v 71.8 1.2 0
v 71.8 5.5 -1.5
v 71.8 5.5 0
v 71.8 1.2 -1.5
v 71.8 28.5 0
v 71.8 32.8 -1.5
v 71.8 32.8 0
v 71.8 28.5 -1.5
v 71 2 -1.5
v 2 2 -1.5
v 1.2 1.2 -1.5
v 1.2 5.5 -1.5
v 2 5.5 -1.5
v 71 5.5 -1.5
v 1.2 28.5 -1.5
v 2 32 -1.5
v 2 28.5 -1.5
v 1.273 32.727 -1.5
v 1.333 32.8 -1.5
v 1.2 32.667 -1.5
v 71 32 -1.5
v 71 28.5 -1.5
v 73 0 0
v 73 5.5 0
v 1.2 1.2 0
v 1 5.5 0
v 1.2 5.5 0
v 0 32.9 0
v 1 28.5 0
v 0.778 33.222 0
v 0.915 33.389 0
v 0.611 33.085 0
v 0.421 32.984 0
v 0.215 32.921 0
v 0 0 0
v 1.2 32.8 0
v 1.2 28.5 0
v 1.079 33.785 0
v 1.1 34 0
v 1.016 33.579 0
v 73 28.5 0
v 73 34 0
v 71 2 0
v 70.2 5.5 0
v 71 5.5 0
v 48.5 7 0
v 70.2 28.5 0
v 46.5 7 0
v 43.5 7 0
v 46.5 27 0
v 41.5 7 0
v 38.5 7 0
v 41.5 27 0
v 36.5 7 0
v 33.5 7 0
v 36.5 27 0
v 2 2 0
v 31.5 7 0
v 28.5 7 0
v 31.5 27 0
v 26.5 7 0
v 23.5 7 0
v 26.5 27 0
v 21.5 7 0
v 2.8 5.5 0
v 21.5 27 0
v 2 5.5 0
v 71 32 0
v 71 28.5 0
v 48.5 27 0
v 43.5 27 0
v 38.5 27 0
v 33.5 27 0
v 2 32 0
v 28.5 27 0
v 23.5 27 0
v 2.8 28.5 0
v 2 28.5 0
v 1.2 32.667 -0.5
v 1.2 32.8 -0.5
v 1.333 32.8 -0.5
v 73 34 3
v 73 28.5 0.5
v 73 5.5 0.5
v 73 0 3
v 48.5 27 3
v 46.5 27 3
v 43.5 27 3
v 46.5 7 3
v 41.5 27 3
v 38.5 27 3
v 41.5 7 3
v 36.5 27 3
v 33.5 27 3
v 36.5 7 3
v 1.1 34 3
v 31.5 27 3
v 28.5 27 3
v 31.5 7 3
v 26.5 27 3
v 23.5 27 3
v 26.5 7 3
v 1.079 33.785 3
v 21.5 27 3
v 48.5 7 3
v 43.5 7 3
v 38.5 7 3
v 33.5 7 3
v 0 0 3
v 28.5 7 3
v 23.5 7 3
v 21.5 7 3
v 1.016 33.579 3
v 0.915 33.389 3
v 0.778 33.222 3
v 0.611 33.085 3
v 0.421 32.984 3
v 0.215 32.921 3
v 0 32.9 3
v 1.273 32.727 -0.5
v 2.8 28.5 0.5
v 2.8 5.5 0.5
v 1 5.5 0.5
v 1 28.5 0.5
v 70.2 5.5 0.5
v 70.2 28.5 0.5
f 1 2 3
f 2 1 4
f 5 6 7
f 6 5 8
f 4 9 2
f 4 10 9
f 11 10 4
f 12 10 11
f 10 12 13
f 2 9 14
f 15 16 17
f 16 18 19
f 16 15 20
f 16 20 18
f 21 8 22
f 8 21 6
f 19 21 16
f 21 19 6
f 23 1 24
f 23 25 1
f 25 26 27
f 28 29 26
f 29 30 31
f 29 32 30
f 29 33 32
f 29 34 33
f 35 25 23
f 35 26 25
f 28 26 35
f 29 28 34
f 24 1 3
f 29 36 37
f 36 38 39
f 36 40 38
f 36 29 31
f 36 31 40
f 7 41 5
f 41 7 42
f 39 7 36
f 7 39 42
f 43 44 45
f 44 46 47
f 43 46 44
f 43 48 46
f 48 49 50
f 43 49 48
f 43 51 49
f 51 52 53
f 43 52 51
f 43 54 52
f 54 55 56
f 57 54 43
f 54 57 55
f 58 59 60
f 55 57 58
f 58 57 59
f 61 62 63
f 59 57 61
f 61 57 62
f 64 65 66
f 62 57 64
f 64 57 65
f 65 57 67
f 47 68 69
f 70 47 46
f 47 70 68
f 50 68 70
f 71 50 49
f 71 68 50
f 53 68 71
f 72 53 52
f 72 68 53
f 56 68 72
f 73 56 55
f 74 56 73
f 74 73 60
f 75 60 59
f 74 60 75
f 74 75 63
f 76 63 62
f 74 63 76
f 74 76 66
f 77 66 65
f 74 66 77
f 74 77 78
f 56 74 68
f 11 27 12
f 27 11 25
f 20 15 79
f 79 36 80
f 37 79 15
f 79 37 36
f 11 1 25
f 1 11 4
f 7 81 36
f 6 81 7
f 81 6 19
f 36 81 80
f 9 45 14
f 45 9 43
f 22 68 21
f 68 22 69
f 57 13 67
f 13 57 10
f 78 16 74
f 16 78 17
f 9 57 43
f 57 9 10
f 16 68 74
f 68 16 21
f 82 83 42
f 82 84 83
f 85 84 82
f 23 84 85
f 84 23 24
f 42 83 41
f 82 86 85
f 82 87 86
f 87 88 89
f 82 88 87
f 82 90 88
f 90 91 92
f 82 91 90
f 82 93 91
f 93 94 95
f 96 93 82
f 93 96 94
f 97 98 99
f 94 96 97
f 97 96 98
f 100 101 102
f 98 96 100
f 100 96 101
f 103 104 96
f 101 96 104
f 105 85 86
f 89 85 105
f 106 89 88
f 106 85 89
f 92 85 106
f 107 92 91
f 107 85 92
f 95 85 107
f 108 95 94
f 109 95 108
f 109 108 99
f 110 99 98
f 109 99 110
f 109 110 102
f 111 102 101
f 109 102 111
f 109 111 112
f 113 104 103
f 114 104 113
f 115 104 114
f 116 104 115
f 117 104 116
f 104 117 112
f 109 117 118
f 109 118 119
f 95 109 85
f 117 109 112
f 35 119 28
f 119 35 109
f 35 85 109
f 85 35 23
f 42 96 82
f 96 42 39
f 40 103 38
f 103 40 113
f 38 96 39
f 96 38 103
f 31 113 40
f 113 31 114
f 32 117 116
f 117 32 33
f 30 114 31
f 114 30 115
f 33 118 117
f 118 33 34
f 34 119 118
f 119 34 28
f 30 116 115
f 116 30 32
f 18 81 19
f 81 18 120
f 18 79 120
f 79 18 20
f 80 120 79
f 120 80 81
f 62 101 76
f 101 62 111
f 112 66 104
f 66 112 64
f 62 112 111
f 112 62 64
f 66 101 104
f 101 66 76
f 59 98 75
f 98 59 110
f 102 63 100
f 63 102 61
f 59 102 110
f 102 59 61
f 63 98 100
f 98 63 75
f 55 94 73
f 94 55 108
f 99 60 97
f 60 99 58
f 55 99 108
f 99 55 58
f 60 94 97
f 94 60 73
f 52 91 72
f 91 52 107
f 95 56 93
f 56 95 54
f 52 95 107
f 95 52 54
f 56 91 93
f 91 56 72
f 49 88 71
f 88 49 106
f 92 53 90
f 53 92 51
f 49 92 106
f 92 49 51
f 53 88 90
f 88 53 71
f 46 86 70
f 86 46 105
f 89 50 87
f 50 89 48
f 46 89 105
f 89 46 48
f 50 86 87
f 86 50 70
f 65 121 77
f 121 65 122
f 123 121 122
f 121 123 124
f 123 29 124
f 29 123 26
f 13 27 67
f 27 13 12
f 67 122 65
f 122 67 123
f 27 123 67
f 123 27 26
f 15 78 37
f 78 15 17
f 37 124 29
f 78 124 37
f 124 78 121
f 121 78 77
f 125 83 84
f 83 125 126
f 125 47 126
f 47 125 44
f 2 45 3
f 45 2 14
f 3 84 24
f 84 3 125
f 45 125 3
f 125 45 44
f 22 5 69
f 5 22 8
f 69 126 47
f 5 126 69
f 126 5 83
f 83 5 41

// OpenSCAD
// ==========================================
// Raspberry Pi Zero 2 W - Bento Box (Top Cover) - 3.0mm Cover Thickness
// ==========================================

// --- Raspberry Pi Zero 2 W 基本サイズ ---
pi_w = 69.0; // SDカードの2mmはみ出しを含めた調整値
pi_d = 30.0; 

// --- ケースの基本設定 ---
thickness       = 1.0;    // 周囲の壁の厚み (1.0mm)
clearance       = 1.0;    // 基板とケース内壁の隙間
cover_thickness = 3.0;    // 🛠️【新機能】蓋の天面プレート自体の厚みを3.0mmに強化
cover_h         = 1.5;    // 内部部品と干渉しないようインロー高さを1.5mmに最適化

// 内寸と外寸の計算
inner_w = pi_w + (clearance * 2);
inner_d = pi_d + (clearance * 2);
outer_w = inner_w + (thickness * 2);
outer_d = inner_d + (thickness * 2); // 🛠️【修正】thickness=1.0により、正確に 34.0mm に固定されます

// 🔩 反対側（奥側）のフチから手前に向かって「9.0mm」離した位置（Y=25.0）に固定
bracket_y = 25.0; 

bracket_screw_pass_r = 1.1; // M2ネジがスムーズに通る直径2.2mmの穴

$fn = 32;

// --- メインレンダリング ---
// 3Dプリンターベッドの上に正しく接地するように座標修正
translate([0, outer_d, cover_thickness])
    rotate([180, 0, 0])
        top_cover();

// --- モジュール定義 ---
module top_cover() {
    fit_gap       = 0.2; // 嵌め合い部（インロー）のクリアランス
    lip_thickness = 0.8; // インローの突起自体の肉厚
    
    difference() {
        union() {
            // 🛠️ 蓋の天面プレート（厚みを3.0mmに強化）
            cube([outer_w, outer_d, cover_thickness]);
            
            // 凹凸の噛み合わせ（インロー固定部）
            translate([thickness + fit_gap, thickness + fit_gap, cover_thickness])
                difference() {
                    cube([inner_w - (fit_gap * 2), inner_d - (fit_gap * 2), cover_h]);
                    
                    // 内側をくり抜いて突起（リップ）を形成
                    translate([lip_thickness, lip_thickness, -0.5])
                        cube([
                            inner_w - (fit_gap * 2) - (lip_thickness * 2), 
                            inner_d - (fit_gap * 2) - (lip_thickness * 2), 
                            cover_h + 1
                        ]);
                }
        }
        
        // ✂️ ボトム側の左右21mm窓と干渉するインローの壁をカットする処理
        translate([thickness, outer_d/2 - 11.5, cover_thickness - 0.5])
            cube([lip_thickness + 1, 23, cover_h + 1]);
            
        translate([outer_w - thickness - lip_thickness - 1, outer_d/2 - 11.5, cover_thickness - 0.5])
            cube([lip_thickness + 2, 23, cover_h + 1]);

        // 🔩 🛠️【修正】3.0mmの厚みを完全に撃ち抜くネジ穴（絶対零度から貫通させます）
        translate([0, 0, -0.5]) {
            bracket_mount_hole(7.0, bracket_y);
            bracket_mount_hole(16.0, bracket_y);
        }

        // 放熱用のスリット穴（3mm厚を確実に貫通させます）
        for (i = [0 : 5]) {
            translate([outer_w / 2 - 15 + (i * 5), outer_d / 2 - 10, -0.5])
                cube([2, 20, cover_thickness + 1]);
        }
    }
}

// 貫通穴と皿モミ加工モジュール
module bracket_mount_hole(x, y) {
    // M2ネジ用貫通穴 (全体の高さに合わせて貫通長さを調整)
    cylinder(r = bracket_screw_pass_r, h = cover_thickness + cover_h + 1.0);
    
    // 🛠️【修正】天面が3mmに厚くなったため、皿頭がツライチに沈むよう皿モミ深さを 1.5mm に深く加工
    // 3Dプリンターベッド設置面（外面）側に綺麗に掘られます
    translate([0, 0, cover_thickness + cover_h - 0.5])
        cylinder(r = 1.8, h = 1.5);
}
